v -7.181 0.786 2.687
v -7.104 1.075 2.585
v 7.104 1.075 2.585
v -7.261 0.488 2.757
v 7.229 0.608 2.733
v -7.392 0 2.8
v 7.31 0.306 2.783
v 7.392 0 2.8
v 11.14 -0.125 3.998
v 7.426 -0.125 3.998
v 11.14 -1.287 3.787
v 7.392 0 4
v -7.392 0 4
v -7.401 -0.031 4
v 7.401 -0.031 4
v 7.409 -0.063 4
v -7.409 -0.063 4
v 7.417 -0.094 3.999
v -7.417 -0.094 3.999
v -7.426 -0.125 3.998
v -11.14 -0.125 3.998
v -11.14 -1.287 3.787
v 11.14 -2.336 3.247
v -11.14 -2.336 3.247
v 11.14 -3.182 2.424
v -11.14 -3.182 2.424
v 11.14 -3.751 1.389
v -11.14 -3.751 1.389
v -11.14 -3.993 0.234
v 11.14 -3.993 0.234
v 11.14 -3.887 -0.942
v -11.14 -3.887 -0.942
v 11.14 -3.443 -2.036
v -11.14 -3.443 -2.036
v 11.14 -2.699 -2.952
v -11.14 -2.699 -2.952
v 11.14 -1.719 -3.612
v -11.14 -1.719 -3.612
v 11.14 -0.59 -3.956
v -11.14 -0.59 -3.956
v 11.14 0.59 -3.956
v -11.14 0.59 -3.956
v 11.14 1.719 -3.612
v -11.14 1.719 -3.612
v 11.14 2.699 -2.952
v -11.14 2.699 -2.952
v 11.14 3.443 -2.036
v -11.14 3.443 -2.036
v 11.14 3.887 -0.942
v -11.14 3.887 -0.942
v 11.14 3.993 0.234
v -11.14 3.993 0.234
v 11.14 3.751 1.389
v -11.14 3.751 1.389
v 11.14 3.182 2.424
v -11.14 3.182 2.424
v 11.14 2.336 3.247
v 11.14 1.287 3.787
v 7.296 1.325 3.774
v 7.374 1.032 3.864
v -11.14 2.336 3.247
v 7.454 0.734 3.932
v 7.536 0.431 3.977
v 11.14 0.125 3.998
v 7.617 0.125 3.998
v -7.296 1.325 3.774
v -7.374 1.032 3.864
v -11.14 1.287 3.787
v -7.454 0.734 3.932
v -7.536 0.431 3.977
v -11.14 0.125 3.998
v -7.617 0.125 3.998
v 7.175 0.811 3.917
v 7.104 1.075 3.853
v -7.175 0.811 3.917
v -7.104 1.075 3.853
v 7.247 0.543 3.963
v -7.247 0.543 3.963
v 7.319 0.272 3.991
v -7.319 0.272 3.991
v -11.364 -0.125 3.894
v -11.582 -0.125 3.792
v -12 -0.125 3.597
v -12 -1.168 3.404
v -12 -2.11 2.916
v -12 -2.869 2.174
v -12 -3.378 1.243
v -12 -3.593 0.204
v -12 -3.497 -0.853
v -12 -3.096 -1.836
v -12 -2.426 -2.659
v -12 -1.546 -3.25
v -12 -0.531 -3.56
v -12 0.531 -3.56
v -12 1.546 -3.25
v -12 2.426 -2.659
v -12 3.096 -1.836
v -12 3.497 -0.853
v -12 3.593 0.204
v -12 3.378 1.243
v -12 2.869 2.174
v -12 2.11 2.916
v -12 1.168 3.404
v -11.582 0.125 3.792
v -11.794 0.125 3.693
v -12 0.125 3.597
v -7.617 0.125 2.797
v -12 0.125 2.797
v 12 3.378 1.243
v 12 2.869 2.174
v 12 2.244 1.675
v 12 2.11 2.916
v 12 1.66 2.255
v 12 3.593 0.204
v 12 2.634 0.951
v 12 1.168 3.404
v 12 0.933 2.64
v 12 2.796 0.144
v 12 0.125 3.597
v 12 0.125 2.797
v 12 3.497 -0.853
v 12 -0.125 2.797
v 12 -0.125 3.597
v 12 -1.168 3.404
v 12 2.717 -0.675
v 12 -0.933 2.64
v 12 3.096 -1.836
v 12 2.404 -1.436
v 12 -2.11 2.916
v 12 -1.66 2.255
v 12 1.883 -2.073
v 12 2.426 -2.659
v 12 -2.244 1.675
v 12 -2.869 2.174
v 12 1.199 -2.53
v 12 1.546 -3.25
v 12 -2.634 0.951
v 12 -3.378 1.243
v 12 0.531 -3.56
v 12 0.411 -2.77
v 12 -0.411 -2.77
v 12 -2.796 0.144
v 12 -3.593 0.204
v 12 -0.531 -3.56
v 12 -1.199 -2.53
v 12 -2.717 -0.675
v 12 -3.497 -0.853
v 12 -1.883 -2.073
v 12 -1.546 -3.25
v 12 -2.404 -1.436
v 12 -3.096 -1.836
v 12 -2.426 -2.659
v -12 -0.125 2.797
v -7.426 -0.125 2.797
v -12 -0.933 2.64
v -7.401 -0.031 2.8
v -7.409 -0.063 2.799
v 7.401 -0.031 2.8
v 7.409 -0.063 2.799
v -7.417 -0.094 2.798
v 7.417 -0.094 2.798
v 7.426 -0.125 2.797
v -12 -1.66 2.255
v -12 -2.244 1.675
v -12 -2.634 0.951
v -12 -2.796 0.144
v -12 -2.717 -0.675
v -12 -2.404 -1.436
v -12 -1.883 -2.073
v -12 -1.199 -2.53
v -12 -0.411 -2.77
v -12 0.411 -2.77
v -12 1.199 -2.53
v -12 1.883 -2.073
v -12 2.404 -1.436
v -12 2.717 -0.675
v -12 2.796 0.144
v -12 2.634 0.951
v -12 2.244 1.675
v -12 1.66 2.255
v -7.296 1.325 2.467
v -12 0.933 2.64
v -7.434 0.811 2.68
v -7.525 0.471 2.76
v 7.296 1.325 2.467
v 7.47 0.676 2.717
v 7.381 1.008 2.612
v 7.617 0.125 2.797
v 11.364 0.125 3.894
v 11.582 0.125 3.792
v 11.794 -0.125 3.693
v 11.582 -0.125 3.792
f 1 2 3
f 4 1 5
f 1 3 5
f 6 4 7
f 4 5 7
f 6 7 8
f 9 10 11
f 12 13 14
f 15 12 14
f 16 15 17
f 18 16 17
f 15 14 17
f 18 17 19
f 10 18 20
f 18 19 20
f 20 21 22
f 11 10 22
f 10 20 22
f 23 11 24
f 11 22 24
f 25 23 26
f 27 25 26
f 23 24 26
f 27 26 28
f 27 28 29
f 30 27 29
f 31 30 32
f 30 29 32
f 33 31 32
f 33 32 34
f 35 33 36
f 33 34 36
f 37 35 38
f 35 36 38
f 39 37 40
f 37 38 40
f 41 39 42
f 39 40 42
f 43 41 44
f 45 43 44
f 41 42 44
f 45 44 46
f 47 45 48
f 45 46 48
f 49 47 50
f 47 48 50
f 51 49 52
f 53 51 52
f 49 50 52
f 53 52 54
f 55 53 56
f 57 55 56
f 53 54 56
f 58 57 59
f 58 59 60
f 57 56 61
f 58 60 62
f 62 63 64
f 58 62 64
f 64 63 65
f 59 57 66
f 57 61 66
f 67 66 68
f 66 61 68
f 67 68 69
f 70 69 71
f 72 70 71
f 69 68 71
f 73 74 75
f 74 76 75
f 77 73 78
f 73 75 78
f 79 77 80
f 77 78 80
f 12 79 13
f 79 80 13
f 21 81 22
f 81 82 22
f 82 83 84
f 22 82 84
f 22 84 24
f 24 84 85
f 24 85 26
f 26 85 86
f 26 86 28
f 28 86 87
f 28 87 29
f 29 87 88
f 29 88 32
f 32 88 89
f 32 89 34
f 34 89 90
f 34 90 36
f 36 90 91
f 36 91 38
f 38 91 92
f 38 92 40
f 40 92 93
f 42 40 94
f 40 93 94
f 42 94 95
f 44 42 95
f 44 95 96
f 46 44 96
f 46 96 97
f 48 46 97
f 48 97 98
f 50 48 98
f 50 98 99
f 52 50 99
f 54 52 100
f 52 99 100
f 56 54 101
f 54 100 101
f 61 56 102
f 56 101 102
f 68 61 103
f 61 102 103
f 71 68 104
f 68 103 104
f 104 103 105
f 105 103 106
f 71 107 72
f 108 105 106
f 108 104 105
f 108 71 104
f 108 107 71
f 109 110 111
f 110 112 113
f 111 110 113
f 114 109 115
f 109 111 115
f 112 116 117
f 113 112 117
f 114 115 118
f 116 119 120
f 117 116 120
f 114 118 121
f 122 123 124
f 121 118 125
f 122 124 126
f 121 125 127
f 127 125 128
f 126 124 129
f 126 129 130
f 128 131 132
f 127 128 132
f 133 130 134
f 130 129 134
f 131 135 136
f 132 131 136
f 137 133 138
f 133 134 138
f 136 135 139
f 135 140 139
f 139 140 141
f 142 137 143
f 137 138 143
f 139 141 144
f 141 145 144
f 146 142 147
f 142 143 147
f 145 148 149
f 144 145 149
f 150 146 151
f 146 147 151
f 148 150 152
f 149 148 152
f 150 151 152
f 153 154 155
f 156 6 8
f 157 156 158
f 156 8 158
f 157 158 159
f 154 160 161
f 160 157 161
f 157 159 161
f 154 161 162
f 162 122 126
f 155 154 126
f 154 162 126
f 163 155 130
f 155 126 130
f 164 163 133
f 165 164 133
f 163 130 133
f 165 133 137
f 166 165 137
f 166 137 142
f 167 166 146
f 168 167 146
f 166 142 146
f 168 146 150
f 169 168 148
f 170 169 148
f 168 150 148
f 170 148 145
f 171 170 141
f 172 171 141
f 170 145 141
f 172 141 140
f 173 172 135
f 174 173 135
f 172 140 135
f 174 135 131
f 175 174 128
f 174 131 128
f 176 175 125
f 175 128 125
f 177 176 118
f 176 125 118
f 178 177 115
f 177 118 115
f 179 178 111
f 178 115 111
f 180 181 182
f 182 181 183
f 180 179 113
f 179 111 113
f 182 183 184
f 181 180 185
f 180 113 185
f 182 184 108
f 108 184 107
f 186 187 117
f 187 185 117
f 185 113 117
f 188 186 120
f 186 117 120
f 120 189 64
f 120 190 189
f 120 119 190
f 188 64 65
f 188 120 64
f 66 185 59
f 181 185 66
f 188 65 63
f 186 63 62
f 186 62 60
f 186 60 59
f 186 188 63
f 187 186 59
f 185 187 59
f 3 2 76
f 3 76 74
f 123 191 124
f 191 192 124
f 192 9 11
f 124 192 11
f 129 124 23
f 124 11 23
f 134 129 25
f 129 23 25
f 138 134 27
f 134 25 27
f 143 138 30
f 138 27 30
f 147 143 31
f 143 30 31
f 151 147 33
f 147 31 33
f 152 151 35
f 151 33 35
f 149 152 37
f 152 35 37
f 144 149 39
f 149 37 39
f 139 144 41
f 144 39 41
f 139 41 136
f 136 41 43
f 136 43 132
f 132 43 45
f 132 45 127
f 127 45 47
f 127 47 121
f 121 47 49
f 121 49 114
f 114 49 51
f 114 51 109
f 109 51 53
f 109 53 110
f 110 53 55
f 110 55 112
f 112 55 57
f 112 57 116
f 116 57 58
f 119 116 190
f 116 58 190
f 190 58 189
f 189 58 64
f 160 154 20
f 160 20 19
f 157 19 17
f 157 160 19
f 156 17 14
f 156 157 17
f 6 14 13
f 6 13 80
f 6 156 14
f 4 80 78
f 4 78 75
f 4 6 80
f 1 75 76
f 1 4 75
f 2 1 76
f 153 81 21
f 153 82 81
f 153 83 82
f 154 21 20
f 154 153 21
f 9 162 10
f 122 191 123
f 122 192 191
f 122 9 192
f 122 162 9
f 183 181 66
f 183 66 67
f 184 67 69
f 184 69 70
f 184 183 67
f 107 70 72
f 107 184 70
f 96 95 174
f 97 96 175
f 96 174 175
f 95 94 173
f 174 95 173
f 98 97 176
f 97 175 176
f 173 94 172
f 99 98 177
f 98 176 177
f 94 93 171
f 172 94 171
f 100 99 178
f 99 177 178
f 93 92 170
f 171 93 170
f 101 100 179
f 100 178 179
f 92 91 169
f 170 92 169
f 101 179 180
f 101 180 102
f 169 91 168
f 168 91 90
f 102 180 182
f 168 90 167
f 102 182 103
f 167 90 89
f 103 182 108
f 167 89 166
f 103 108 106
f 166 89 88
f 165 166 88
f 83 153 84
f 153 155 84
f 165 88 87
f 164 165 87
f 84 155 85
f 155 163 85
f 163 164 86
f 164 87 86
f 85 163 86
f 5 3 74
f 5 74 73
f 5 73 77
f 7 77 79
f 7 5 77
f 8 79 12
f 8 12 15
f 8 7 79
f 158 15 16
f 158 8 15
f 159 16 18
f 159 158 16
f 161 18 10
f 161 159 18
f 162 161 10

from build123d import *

# Parameters (mm, degrees)
CUT_EXTRUDE_THIN1_DEPTH = 14.266499161


with BuildPart() as part:
    # Sketch1 → Revolve1 (revolve)
    with BuildSketch(Plane.XY, mode=Mode.PRIVATE) as revolve1_sk:
        Polygon((-12, 2.8), (12, 2.8), (12, 3.5992), (11.140481626, 4), (-11.140481626, 4), (-12, 3.5992), align=None)
    revolve(revolve1_sk.sketch.rotate(Axis((-12, 0, 0), (1, 0, 0)), 90), axis=Axis((-12, 0, 0), (1, 0, 0)))

    # Sketch2 → Cut-Extrude-Thin1 (cut, through all)
    with BuildSketch(Plane.XY):
        Polygon((-12, -0.125), (-7.425623157, -0.125), (-7.104084127, 1.075), (7.104084127, 1.075), (7.425623157, -0.125), (12, -0.125), (12, 0.125), (7.617454904, 0.125), (7.295915873, 1.325), (-7.295915873, 1.325), (-7.617454904, 0.125), (-12, 0.125), align=None)
    extrude(amount=CUT_EXTRUDE_THIN1_DEPTH, mode=Mode.SUBTRACT)


solid = part.part
